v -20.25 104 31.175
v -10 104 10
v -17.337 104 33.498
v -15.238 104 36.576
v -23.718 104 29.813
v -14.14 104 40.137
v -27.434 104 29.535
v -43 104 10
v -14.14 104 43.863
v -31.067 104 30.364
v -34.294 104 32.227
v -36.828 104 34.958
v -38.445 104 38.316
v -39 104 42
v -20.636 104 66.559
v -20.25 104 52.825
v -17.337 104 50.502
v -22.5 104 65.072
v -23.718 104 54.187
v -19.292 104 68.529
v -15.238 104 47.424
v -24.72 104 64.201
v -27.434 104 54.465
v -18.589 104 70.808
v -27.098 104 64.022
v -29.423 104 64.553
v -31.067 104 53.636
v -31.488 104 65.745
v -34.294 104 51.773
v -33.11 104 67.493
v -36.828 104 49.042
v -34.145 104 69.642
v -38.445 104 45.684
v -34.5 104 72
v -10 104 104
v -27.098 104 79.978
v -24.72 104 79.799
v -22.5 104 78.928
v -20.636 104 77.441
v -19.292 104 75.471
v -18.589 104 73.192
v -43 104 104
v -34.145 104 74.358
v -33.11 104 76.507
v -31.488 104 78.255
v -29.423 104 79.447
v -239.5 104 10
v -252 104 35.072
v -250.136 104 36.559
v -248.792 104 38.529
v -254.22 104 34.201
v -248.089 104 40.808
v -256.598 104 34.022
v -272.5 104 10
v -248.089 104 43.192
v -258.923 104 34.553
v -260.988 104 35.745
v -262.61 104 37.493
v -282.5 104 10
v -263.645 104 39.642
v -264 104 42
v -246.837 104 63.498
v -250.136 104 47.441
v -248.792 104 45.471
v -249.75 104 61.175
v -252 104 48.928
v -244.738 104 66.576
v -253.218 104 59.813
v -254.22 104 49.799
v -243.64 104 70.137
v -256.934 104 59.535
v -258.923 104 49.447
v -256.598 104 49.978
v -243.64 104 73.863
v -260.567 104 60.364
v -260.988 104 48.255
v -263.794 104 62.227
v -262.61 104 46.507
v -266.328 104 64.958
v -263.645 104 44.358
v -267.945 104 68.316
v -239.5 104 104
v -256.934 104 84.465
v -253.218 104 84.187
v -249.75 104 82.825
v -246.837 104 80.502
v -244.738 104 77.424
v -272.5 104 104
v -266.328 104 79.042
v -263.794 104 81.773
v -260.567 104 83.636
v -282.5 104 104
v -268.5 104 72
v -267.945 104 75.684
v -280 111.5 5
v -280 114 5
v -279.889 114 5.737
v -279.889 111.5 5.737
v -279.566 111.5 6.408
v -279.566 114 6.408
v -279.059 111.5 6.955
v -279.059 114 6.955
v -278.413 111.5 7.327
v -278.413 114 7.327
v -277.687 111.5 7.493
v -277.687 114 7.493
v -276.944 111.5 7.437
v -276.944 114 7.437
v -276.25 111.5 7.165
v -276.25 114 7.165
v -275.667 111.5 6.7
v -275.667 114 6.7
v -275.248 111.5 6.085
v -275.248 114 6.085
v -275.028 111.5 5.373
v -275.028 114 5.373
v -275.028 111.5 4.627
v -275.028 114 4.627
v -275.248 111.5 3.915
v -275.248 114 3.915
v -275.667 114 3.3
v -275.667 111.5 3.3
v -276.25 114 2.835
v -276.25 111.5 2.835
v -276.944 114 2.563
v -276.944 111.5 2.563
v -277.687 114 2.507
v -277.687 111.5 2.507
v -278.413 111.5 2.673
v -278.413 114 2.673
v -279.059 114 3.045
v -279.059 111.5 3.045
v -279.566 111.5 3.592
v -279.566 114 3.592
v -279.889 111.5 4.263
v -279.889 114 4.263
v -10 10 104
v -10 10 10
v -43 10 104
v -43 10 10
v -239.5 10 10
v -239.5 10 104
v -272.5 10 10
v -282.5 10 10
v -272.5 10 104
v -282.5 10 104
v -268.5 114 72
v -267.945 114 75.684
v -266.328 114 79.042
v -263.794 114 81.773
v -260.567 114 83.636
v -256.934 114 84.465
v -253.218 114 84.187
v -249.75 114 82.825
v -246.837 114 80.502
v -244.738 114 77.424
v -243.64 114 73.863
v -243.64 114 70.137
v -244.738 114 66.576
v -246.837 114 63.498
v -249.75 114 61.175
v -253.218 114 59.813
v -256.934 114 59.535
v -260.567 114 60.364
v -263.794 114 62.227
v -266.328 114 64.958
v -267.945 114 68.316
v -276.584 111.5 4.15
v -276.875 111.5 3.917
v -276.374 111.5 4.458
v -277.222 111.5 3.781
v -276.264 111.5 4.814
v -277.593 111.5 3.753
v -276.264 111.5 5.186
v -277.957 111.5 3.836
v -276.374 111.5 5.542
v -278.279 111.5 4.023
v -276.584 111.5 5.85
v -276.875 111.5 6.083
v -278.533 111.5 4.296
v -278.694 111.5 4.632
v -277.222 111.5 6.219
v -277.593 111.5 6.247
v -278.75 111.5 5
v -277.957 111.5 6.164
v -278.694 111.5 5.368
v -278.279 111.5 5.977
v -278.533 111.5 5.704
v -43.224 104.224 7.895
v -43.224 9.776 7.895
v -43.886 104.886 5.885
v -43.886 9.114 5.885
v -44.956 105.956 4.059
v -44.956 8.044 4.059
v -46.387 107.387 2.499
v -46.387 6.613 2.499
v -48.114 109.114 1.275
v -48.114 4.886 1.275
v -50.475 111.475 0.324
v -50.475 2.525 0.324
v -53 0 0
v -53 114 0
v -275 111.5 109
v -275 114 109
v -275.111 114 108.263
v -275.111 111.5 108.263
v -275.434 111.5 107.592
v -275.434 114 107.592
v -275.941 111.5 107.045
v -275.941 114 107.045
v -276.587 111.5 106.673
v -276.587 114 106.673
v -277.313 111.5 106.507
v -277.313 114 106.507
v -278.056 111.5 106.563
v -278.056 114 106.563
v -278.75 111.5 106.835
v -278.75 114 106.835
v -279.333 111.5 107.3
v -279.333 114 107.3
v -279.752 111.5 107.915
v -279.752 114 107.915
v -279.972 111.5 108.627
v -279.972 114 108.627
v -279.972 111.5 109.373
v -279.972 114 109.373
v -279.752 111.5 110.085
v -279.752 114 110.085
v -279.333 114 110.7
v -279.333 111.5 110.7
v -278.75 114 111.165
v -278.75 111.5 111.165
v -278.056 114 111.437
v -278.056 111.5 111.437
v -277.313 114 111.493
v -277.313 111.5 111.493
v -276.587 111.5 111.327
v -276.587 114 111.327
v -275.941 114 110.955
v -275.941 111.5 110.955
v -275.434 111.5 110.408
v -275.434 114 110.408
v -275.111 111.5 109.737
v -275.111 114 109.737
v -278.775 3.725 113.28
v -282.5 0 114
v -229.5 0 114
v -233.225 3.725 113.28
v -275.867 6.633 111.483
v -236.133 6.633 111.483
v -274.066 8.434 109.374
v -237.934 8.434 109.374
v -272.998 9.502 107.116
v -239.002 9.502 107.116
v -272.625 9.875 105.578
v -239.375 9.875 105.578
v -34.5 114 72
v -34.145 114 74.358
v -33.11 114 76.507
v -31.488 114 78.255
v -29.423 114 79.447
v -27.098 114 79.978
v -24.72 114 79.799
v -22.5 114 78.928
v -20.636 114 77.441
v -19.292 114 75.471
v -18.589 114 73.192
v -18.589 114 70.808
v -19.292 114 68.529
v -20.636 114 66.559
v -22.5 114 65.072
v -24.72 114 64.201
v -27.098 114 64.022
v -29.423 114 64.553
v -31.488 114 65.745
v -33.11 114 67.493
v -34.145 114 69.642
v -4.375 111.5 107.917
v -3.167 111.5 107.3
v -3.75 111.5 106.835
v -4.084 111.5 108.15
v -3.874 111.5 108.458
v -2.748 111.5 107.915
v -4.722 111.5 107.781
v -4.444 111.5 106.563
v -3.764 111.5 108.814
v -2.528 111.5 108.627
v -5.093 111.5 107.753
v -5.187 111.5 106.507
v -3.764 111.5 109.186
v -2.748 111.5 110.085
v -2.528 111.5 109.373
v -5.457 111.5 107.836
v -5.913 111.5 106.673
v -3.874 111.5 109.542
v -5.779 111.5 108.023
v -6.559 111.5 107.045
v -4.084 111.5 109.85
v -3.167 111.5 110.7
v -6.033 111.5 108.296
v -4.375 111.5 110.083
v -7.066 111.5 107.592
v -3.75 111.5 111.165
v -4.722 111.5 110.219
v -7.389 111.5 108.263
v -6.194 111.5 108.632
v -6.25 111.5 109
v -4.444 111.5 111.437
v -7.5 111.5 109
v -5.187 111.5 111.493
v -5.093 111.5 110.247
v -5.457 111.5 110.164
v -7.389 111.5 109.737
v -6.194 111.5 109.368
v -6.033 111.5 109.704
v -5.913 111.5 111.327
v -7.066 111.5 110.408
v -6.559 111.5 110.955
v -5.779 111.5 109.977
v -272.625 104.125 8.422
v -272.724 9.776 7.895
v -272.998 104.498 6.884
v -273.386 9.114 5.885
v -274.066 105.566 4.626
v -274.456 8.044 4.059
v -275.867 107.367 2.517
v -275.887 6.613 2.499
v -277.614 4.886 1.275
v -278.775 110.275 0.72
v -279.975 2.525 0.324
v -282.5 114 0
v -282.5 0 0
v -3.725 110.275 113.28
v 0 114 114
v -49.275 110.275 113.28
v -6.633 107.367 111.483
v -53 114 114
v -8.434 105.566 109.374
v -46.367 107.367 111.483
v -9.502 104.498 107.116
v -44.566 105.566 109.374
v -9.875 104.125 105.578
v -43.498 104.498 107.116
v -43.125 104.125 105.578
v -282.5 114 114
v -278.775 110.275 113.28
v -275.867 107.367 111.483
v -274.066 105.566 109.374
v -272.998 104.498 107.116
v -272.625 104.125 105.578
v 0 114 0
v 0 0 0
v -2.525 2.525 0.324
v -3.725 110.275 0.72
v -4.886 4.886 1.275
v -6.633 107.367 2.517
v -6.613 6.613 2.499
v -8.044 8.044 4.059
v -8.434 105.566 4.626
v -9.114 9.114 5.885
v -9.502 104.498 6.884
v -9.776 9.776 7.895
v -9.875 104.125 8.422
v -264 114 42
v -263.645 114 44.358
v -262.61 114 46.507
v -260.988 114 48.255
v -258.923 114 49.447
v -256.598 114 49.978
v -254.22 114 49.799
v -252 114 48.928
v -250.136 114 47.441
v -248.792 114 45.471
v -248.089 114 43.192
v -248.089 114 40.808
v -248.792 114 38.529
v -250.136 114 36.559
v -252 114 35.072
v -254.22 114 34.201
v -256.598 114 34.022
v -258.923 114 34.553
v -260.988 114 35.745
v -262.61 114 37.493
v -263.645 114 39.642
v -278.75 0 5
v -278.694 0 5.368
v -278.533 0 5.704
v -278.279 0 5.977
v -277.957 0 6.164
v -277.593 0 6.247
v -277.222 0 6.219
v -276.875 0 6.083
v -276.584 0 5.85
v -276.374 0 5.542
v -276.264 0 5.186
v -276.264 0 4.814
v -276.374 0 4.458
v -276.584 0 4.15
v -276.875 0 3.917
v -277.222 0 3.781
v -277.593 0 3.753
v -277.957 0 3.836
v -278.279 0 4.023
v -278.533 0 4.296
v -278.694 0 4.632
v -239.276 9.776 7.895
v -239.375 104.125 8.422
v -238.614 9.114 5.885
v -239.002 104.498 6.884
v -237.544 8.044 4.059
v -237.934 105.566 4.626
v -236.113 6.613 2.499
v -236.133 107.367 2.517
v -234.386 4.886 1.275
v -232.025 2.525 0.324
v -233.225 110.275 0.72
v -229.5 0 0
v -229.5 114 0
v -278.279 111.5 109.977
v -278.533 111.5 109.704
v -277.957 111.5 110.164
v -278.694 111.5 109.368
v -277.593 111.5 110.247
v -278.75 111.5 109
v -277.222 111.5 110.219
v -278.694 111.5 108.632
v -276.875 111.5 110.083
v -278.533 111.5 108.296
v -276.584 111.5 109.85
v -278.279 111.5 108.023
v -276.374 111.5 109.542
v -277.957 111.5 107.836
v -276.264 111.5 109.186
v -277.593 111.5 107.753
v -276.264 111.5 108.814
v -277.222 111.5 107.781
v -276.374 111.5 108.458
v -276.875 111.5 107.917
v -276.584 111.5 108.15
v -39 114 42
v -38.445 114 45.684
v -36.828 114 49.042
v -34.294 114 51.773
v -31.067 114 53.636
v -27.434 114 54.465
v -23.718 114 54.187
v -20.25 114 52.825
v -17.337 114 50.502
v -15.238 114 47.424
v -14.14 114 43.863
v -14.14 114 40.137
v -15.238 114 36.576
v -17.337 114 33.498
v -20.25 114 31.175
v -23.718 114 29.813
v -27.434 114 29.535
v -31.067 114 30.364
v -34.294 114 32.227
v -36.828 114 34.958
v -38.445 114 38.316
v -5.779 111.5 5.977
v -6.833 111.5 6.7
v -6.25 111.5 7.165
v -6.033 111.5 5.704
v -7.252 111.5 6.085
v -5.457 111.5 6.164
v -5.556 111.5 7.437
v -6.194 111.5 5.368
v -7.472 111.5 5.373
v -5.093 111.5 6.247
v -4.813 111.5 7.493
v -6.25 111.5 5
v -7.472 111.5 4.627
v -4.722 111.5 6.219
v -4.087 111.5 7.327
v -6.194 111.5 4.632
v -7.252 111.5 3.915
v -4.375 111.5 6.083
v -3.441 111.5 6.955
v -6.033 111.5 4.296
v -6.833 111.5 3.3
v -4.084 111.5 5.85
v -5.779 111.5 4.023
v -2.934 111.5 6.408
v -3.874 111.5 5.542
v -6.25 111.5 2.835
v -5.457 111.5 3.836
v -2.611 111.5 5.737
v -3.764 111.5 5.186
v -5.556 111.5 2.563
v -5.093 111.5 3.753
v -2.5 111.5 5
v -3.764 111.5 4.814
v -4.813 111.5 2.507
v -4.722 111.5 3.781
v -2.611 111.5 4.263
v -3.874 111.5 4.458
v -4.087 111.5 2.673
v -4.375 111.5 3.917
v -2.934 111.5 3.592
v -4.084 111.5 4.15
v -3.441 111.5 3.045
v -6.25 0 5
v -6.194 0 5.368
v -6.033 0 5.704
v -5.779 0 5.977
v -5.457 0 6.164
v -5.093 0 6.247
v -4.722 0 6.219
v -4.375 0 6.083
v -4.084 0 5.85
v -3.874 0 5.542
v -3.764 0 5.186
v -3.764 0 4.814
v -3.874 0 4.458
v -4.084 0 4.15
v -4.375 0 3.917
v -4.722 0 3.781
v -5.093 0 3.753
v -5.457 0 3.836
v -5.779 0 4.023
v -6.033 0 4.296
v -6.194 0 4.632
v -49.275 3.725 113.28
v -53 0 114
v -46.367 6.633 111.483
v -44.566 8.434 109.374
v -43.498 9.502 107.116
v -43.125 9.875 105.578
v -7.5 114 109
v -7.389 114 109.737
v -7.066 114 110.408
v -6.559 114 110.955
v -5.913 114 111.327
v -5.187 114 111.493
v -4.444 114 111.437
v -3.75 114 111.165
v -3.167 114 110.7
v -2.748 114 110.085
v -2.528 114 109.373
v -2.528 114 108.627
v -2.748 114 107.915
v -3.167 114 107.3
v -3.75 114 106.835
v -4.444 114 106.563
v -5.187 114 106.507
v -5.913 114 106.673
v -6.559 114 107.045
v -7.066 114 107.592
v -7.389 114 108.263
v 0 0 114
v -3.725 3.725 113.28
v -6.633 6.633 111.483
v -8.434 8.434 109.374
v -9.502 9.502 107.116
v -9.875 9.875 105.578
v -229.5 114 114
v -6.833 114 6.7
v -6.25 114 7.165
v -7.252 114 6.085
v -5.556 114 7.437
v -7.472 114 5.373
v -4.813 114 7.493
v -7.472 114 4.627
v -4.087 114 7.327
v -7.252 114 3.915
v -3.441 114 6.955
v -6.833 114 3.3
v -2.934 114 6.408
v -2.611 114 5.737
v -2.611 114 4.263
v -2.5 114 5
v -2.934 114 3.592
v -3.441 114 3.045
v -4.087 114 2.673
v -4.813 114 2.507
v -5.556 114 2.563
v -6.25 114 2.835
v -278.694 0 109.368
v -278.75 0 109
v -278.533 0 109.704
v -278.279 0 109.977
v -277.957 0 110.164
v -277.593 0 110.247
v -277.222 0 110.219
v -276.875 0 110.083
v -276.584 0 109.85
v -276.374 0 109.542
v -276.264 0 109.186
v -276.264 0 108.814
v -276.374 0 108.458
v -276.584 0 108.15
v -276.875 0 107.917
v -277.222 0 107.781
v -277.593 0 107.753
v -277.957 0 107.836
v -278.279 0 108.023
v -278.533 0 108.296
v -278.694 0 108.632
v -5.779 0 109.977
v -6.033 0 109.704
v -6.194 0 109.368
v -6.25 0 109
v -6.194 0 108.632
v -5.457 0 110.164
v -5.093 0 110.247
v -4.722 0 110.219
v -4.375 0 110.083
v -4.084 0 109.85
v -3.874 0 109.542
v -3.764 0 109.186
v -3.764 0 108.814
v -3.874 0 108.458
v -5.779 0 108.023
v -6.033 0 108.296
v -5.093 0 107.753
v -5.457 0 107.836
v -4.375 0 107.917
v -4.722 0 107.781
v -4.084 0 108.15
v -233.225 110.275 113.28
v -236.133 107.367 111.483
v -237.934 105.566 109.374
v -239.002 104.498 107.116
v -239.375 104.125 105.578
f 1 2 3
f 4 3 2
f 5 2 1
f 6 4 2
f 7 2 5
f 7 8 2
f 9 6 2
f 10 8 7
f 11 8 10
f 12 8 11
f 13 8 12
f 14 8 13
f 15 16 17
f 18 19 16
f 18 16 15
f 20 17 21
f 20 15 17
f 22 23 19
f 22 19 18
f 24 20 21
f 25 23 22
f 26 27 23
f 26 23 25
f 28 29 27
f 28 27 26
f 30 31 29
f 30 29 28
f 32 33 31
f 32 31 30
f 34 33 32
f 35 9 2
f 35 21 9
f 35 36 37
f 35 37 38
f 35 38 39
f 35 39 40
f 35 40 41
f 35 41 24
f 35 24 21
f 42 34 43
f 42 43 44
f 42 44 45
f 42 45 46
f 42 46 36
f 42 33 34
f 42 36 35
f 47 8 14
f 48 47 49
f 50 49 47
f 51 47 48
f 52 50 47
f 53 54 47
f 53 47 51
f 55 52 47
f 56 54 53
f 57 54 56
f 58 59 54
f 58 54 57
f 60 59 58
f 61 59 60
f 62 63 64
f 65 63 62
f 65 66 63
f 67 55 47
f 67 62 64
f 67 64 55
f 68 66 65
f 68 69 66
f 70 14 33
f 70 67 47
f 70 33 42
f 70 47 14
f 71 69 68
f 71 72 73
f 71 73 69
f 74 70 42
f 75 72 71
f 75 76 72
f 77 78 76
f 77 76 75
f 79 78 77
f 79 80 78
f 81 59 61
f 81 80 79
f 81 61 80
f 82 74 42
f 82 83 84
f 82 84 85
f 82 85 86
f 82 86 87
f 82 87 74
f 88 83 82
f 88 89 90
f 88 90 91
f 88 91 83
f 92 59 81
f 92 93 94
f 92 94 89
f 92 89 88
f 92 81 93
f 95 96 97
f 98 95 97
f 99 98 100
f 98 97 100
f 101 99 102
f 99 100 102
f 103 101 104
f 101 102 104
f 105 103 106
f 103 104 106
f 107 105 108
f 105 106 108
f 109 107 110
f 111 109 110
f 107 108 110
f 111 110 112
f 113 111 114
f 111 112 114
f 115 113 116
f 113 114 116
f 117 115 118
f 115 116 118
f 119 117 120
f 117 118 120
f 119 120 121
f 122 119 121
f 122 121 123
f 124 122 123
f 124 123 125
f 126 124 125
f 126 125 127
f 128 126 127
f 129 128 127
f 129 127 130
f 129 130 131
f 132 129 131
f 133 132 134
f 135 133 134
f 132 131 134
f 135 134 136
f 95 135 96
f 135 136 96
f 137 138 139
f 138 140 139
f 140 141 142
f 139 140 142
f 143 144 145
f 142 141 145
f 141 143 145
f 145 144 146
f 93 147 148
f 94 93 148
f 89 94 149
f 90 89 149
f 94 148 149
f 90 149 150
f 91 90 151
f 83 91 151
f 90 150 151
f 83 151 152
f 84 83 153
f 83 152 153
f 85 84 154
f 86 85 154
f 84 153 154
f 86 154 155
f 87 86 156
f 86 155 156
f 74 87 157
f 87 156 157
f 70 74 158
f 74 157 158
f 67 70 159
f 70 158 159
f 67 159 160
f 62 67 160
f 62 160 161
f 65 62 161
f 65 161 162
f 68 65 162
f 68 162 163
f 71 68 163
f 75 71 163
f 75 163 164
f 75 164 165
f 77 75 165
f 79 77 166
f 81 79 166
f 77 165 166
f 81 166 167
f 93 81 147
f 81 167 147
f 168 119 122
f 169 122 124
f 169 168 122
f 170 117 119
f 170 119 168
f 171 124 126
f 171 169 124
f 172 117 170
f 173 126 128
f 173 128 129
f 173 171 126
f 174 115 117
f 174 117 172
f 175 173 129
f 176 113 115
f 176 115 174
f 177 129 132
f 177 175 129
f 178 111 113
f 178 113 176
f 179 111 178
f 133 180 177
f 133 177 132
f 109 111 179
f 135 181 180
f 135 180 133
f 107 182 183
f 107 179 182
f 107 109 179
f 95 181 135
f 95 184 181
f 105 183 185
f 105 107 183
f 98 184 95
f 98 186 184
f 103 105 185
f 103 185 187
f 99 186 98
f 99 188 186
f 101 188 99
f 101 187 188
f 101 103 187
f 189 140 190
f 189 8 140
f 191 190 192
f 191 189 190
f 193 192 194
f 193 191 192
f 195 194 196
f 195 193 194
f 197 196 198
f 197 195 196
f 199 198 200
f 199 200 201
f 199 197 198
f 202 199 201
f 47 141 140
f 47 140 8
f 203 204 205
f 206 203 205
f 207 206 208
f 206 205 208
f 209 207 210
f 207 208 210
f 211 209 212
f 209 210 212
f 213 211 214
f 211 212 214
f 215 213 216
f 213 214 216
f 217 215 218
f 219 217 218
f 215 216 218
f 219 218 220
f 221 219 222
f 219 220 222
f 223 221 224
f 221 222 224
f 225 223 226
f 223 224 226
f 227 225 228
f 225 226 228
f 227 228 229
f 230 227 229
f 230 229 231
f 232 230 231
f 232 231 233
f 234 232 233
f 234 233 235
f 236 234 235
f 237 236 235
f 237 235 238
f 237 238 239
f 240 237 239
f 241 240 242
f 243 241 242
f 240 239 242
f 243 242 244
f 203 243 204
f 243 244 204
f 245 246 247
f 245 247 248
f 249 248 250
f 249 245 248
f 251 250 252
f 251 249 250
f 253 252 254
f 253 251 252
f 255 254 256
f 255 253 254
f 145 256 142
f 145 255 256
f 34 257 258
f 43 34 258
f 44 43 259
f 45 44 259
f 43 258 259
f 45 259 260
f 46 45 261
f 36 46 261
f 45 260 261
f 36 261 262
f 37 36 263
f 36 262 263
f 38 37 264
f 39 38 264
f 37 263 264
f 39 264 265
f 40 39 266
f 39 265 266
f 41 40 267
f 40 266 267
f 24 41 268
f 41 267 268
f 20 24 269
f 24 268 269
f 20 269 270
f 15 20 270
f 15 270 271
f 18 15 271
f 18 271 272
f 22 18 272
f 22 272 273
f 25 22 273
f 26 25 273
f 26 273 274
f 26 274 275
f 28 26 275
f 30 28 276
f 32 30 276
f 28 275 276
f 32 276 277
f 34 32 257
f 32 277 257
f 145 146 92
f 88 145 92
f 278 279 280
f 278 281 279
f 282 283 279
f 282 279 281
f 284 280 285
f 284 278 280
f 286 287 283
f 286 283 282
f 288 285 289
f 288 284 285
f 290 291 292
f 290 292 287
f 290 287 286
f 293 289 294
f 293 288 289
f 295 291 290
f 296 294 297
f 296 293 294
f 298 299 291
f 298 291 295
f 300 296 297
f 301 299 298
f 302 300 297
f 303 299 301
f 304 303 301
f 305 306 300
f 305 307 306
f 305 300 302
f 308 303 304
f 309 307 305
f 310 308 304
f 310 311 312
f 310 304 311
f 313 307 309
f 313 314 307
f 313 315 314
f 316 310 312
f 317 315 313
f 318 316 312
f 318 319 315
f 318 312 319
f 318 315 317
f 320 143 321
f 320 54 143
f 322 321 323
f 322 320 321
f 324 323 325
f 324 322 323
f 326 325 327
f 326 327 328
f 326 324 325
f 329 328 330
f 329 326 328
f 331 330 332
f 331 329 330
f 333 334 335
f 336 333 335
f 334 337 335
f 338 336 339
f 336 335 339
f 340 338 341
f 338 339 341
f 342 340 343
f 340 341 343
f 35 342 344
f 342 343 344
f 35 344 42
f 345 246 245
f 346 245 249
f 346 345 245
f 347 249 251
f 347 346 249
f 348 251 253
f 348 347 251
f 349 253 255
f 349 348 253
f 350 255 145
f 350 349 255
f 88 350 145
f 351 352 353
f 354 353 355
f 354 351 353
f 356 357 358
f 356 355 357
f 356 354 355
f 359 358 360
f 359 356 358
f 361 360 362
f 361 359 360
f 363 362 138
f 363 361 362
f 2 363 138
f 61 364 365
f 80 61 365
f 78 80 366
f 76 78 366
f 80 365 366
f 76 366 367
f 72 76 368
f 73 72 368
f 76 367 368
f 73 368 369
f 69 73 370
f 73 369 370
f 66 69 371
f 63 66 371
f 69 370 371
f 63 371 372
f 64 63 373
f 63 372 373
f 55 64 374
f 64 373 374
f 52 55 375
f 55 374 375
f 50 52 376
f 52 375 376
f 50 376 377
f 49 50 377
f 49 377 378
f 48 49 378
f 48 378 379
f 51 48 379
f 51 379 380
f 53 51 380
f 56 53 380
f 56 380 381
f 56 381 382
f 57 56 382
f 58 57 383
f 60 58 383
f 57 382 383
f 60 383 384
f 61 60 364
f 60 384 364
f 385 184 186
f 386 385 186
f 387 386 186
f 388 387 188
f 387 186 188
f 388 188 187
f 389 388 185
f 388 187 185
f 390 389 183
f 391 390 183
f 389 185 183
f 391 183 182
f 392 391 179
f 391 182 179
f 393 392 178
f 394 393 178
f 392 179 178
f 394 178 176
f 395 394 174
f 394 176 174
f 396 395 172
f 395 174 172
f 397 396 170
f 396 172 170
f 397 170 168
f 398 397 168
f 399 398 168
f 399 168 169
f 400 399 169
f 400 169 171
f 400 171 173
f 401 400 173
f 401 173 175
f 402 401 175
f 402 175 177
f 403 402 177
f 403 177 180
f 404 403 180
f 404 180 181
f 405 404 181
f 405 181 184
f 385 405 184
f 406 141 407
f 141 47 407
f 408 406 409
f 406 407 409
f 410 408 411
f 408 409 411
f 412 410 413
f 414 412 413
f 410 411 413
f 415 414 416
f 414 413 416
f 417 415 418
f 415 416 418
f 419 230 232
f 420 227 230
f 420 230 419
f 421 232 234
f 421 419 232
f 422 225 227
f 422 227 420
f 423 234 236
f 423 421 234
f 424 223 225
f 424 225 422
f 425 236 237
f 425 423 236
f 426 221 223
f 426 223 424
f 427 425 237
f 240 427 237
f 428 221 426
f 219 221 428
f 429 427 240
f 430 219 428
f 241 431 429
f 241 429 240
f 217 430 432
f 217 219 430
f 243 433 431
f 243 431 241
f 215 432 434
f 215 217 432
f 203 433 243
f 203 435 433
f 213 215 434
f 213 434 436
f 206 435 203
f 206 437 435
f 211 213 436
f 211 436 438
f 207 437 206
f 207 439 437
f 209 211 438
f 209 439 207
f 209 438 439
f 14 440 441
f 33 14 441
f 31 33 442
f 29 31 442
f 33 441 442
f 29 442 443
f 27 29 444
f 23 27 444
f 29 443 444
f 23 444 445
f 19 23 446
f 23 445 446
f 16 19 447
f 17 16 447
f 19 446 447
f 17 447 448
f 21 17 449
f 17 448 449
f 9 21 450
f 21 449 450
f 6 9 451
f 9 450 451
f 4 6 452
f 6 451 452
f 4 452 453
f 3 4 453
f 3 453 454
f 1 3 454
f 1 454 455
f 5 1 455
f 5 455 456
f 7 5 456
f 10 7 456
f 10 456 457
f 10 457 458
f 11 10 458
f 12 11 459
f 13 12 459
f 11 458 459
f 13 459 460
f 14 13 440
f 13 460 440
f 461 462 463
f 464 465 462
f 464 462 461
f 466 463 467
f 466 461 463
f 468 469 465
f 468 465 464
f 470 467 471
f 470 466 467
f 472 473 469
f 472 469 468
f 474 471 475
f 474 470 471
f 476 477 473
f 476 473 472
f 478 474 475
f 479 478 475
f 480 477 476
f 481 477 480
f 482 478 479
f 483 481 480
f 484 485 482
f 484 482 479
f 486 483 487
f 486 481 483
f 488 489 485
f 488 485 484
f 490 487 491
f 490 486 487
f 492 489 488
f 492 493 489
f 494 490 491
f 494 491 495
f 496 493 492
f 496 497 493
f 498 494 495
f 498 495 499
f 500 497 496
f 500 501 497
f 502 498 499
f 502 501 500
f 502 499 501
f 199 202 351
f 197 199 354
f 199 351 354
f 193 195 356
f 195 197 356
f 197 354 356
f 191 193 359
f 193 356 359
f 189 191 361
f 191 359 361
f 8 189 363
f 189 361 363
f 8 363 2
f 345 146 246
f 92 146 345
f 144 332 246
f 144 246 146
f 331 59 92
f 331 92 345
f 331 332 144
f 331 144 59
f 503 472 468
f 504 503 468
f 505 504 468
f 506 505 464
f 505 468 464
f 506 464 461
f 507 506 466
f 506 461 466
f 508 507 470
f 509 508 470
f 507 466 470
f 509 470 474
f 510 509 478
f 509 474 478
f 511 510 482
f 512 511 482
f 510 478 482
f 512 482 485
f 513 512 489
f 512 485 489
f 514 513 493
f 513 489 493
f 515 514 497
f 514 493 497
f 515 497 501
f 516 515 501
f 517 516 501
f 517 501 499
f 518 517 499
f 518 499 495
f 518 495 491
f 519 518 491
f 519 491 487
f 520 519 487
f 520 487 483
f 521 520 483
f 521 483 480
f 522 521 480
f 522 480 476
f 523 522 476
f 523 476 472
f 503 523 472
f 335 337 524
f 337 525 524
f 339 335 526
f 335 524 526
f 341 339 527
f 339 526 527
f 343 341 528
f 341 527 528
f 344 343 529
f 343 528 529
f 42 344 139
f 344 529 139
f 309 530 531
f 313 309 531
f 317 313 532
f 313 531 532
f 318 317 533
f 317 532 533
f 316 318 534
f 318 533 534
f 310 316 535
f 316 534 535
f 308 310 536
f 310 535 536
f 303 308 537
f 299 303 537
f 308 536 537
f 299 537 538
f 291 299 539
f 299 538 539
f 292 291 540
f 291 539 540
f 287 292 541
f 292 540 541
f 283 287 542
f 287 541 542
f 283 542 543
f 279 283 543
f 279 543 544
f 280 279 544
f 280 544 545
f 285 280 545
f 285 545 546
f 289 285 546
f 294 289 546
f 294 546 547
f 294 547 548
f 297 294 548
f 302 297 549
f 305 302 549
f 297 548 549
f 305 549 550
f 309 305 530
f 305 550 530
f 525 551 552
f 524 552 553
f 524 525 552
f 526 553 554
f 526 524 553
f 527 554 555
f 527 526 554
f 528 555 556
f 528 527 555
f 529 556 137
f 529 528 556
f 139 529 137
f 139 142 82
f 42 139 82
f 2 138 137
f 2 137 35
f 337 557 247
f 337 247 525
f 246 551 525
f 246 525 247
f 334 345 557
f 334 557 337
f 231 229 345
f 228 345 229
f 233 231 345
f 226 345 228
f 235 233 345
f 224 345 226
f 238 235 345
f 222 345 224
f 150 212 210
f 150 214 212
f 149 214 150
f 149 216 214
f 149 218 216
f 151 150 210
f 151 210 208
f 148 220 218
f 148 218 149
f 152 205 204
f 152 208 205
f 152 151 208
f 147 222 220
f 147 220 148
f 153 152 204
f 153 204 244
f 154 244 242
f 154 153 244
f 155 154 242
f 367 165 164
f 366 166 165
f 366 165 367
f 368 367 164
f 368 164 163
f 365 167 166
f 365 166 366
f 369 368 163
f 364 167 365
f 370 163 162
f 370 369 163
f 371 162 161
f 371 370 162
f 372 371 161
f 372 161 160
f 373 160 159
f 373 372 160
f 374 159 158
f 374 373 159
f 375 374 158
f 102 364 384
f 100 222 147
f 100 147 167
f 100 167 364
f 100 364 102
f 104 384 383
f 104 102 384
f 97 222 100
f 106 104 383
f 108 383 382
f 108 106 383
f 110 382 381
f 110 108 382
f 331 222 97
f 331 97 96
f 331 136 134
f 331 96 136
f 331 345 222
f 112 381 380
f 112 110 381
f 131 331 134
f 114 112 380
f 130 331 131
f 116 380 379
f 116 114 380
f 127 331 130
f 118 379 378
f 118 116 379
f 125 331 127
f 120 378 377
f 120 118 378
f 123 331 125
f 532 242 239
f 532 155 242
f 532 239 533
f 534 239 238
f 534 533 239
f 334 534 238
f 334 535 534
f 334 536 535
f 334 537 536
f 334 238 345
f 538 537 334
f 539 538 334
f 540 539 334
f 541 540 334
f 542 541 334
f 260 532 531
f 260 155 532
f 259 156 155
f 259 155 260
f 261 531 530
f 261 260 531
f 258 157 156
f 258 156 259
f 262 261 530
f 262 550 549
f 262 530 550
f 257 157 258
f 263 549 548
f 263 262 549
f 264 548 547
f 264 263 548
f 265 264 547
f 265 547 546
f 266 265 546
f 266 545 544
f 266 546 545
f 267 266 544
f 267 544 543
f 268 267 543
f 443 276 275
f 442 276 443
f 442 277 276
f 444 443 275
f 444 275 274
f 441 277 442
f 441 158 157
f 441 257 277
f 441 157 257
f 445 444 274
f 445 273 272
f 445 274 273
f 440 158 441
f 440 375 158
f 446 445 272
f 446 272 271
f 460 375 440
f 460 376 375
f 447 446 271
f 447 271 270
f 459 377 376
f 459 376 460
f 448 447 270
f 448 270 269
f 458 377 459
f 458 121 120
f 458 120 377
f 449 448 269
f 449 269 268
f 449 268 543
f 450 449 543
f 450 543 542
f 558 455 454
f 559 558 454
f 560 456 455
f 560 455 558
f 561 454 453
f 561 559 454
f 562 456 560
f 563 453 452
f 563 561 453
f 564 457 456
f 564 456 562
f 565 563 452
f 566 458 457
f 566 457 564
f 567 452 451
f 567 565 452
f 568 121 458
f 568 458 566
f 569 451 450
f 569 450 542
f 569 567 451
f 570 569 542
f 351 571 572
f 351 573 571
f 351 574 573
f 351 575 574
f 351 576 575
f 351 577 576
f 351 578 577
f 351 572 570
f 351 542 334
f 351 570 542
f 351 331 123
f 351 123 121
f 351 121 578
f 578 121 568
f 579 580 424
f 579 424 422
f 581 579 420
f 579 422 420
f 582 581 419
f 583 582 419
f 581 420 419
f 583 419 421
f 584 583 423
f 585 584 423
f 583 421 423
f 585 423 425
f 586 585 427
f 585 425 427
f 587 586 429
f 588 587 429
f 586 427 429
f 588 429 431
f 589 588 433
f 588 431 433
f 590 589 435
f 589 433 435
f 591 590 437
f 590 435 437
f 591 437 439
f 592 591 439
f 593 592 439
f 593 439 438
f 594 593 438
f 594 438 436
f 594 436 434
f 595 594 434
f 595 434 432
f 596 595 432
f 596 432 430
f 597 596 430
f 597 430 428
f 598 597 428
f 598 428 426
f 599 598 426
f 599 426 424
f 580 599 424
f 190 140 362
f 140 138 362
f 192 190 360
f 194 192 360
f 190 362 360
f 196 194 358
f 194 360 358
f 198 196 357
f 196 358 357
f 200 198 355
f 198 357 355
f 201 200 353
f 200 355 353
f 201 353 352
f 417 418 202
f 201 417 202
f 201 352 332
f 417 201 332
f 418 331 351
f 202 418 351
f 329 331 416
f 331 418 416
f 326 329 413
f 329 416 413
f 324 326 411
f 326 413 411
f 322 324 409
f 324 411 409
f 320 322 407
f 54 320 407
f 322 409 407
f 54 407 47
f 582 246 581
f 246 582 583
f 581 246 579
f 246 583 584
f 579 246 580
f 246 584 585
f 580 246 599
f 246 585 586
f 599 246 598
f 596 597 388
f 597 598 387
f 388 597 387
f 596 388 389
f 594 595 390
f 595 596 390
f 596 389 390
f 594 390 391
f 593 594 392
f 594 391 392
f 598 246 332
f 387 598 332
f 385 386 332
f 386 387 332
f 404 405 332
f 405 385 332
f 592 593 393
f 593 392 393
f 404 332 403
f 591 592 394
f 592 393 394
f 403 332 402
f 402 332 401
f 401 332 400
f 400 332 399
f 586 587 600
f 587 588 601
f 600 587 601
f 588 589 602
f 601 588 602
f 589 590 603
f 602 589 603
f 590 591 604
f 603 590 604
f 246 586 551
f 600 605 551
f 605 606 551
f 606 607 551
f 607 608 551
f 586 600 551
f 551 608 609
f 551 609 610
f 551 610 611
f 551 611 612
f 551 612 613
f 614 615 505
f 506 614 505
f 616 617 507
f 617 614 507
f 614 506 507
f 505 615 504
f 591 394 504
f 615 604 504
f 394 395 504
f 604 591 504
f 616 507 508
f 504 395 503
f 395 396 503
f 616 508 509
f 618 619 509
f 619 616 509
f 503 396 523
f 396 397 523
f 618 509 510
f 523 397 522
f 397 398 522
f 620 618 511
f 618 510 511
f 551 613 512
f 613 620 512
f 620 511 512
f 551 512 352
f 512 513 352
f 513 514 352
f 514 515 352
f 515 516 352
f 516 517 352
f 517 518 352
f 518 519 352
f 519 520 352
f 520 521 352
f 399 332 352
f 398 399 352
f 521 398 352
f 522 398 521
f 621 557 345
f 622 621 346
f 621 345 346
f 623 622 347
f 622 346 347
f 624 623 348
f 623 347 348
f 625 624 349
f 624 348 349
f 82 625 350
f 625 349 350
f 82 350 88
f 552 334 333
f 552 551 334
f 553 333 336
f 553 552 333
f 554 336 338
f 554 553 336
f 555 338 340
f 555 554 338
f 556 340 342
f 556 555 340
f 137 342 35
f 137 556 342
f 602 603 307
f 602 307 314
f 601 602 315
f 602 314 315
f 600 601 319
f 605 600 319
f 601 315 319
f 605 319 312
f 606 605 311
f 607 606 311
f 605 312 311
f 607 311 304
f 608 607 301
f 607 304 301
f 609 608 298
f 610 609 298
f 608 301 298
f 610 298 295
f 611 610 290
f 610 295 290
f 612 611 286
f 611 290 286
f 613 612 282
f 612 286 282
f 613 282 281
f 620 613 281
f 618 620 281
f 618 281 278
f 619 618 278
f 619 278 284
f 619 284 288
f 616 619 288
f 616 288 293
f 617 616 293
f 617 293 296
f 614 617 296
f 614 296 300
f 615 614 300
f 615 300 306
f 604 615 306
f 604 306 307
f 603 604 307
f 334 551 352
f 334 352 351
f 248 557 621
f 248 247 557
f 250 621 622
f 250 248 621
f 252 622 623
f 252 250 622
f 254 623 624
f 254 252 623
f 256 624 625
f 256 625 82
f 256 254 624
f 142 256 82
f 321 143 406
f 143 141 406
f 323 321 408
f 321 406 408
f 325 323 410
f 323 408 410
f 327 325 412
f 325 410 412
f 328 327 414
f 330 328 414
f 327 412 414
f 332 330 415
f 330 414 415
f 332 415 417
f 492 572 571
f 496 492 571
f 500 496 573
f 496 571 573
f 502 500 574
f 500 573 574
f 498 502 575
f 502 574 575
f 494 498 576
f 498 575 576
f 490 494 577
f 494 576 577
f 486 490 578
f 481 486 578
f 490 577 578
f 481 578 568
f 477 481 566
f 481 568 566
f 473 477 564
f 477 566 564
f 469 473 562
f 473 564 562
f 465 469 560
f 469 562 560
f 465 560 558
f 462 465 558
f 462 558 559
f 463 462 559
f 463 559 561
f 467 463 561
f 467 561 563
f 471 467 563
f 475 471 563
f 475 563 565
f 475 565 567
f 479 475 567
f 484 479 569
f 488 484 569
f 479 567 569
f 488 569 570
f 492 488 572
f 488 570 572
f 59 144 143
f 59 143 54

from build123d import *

# Parameters (mm, degrees)
SKETCH1_W           = 282.5
SKETCH1_H           = 114
BOSS_EXTRUDE1_DEPTH = 114
SKETCH5_W           = 33
SKETCH5_H           = 94
CUT_EXTRUDE3_DEPTH  = 326.266429255
SKETCH6_W           = 94
SKETCH6_H           = 94
CUT_EXTRUDE4_DEPTH  = 262
SKETCH7_R           = 1.25
CUT_EXTRUDE5_DEPTH  = 262
SKETCH8_R           = 2.5
CUT_EXTRUDE6_DEPTH  = 2.5
FILLET3_R           = 10
FILLET4_R           = 10
FILLET6_R           = 10
SKETCH11_R          = 8
SKETCH11_R_2        = 12.5
CUT_EXTRUDE7_DEPTH  = 10


with BuildPart() as part:
    # Sketch1 → Boss-Extrude1 (new body)
    with BuildSketch(Plane.XY):
        with Locations((-141.25, 57)):
            Rectangle(SKETCH1_W, SKETCH1_H)
    extrude(amount=BOSS_EXTRUDE1_DEPTH)

    # Sketch5 → Cut-Extrude3 (cut, through all)
    with BuildSketch(Plane.XY):
        with Locations((-256, 57)):
            Rectangle(SKETCH5_W, SKETCH5_H)
        with Locations((-26.5, 57)):
            Rectangle(SKETCH5_W, SKETCH5_H)
    extrude(amount=CUT_EXTRUDE3_DEPTH, mode=Mode.SUBTRACT)

    # Sketch6 → Cut-Extrude4 (cut)
    with BuildSketch(Plane.ZY.offset(282.5)):
        with Locations((57, 57)):
            Rectangle(SKETCH6_W, SKETCH6_H)
    extrude(amount=-CUT_EXTRUDE4_DEPTH, mode=Mode.SUBTRACT)

    # Sketch7 → Cut-Extrude5 (cut)
    with BuildSketch(Plane(origin=(0, 114, 0), x_dir=(1, 0, 0), z_dir=(0, 1, 0))):
        with Locations(Location((-277.5, -109, 0), (0, 0, 180))):
            Circle(SKETCH7_R)
        with Locations(Location((-277.5, -5, 0), (0, 0, 180))):
            Circle(SKETCH7_R)
        with Locations(Location((-5, -109, 0), (0, 0, 180))):
            Circle(SKETCH7_R)
        with Locations(Location((-5, -5, 0), (0, 0, 180))):
            Circle(SKETCH7_R)
    extrude(amount=-CUT_EXTRUDE5_DEPTH, mode=Mode.SUBTRACT)

    # Sketch8 → Cut-Extrude6 (cut)
    with BuildSketch(Plane(origin=(0, 114, 0), x_dir=(1, 0, 0), z_dir=(0, 1, 0))):
        with Locations(Location((-277.5, -5, 0), (0, 0, 180))):
            Circle(SKETCH8_R)
        with Locations((-277.5, -109)):
            Circle(SKETCH8_R)
        with Locations((-5, -5)):
            Circle(SKETCH8_R)
        with Locations(Location((-5, -109, 0), (0, 0, 180))):
            Circle(SKETCH8_R)
    extrude(amount=-CUT_EXTRUDE6_DEPTH, mode=Mode.SUBTRACT)

    # Fillet3
    fillet3_edges = [part.edges().sort_by_distance(p)[0] for p in [
        (-256, 104, 114),
    ]]
    fillet(fillet3_edges, radius=FILLET3_R - 0.0001)  # a hair under: the kernel refuses the full size

    # Fillet4
    fillet4_edges = [part.edges().sort_by_distance(p)[0] for p in [
        (-239.5, 61.99995, 114),
        (-272.5, 61.99995, 114),
        (-256, 10, 114),
    ]]
    fillet(fillet4_edges, radius=FILLET4_R - 0.0001)  # a hair under: the kernel refuses the full size

    # Fillet6
    fillet6_edges = [part.edges().sort_by_distance(p)[0] for p in [
        (-256, 104, 0),
        (-239.5, 57, 0),
        (-272.5, 57, 0),
        (-256, 10, 0),
        (-26.5, 10, 0),
        (-10, 57, 0),
        (-43, 57, 0),
        (-26.5, 104, 0),
        (-26.5, 10, 114),
        (-26.5, 104, 114),
        (-10, 57, 114),
        (-43, 57, 114),
    ]]
    fillet(fillet6_edges, radius=FILLET6_R - 0.0001)  # a hair under: the kernel refuses the full size

    # Sketch11 → Cut-Extrude7 (cut)
    with BuildSketch(Plane(origin=(0, 114, 0), x_dir=(1, 0, 0), z_dir=(0, 1, 0))):
        with Locations(Location((-256, -42, 0), (0, 0, 180))):
            Circle(SKETCH11_R)
        with Locations(Location((-256, -72, 0), (0, 0, 180))):
            Circle(SKETCH11_R_2)
        with Locations(Location((-26.5, -42, 0), (0, 0, 180))):
            Circle(SKETCH11_R_2)
        with Locations(Location((-26.5, -72, 0), (0, 0, 180))):
            Circle(SKETCH11_R)
    extrude(amount=-CUT_EXTRUDE7_DEPTH, mode=Mode.SUBTRACT)


solid = part.part
